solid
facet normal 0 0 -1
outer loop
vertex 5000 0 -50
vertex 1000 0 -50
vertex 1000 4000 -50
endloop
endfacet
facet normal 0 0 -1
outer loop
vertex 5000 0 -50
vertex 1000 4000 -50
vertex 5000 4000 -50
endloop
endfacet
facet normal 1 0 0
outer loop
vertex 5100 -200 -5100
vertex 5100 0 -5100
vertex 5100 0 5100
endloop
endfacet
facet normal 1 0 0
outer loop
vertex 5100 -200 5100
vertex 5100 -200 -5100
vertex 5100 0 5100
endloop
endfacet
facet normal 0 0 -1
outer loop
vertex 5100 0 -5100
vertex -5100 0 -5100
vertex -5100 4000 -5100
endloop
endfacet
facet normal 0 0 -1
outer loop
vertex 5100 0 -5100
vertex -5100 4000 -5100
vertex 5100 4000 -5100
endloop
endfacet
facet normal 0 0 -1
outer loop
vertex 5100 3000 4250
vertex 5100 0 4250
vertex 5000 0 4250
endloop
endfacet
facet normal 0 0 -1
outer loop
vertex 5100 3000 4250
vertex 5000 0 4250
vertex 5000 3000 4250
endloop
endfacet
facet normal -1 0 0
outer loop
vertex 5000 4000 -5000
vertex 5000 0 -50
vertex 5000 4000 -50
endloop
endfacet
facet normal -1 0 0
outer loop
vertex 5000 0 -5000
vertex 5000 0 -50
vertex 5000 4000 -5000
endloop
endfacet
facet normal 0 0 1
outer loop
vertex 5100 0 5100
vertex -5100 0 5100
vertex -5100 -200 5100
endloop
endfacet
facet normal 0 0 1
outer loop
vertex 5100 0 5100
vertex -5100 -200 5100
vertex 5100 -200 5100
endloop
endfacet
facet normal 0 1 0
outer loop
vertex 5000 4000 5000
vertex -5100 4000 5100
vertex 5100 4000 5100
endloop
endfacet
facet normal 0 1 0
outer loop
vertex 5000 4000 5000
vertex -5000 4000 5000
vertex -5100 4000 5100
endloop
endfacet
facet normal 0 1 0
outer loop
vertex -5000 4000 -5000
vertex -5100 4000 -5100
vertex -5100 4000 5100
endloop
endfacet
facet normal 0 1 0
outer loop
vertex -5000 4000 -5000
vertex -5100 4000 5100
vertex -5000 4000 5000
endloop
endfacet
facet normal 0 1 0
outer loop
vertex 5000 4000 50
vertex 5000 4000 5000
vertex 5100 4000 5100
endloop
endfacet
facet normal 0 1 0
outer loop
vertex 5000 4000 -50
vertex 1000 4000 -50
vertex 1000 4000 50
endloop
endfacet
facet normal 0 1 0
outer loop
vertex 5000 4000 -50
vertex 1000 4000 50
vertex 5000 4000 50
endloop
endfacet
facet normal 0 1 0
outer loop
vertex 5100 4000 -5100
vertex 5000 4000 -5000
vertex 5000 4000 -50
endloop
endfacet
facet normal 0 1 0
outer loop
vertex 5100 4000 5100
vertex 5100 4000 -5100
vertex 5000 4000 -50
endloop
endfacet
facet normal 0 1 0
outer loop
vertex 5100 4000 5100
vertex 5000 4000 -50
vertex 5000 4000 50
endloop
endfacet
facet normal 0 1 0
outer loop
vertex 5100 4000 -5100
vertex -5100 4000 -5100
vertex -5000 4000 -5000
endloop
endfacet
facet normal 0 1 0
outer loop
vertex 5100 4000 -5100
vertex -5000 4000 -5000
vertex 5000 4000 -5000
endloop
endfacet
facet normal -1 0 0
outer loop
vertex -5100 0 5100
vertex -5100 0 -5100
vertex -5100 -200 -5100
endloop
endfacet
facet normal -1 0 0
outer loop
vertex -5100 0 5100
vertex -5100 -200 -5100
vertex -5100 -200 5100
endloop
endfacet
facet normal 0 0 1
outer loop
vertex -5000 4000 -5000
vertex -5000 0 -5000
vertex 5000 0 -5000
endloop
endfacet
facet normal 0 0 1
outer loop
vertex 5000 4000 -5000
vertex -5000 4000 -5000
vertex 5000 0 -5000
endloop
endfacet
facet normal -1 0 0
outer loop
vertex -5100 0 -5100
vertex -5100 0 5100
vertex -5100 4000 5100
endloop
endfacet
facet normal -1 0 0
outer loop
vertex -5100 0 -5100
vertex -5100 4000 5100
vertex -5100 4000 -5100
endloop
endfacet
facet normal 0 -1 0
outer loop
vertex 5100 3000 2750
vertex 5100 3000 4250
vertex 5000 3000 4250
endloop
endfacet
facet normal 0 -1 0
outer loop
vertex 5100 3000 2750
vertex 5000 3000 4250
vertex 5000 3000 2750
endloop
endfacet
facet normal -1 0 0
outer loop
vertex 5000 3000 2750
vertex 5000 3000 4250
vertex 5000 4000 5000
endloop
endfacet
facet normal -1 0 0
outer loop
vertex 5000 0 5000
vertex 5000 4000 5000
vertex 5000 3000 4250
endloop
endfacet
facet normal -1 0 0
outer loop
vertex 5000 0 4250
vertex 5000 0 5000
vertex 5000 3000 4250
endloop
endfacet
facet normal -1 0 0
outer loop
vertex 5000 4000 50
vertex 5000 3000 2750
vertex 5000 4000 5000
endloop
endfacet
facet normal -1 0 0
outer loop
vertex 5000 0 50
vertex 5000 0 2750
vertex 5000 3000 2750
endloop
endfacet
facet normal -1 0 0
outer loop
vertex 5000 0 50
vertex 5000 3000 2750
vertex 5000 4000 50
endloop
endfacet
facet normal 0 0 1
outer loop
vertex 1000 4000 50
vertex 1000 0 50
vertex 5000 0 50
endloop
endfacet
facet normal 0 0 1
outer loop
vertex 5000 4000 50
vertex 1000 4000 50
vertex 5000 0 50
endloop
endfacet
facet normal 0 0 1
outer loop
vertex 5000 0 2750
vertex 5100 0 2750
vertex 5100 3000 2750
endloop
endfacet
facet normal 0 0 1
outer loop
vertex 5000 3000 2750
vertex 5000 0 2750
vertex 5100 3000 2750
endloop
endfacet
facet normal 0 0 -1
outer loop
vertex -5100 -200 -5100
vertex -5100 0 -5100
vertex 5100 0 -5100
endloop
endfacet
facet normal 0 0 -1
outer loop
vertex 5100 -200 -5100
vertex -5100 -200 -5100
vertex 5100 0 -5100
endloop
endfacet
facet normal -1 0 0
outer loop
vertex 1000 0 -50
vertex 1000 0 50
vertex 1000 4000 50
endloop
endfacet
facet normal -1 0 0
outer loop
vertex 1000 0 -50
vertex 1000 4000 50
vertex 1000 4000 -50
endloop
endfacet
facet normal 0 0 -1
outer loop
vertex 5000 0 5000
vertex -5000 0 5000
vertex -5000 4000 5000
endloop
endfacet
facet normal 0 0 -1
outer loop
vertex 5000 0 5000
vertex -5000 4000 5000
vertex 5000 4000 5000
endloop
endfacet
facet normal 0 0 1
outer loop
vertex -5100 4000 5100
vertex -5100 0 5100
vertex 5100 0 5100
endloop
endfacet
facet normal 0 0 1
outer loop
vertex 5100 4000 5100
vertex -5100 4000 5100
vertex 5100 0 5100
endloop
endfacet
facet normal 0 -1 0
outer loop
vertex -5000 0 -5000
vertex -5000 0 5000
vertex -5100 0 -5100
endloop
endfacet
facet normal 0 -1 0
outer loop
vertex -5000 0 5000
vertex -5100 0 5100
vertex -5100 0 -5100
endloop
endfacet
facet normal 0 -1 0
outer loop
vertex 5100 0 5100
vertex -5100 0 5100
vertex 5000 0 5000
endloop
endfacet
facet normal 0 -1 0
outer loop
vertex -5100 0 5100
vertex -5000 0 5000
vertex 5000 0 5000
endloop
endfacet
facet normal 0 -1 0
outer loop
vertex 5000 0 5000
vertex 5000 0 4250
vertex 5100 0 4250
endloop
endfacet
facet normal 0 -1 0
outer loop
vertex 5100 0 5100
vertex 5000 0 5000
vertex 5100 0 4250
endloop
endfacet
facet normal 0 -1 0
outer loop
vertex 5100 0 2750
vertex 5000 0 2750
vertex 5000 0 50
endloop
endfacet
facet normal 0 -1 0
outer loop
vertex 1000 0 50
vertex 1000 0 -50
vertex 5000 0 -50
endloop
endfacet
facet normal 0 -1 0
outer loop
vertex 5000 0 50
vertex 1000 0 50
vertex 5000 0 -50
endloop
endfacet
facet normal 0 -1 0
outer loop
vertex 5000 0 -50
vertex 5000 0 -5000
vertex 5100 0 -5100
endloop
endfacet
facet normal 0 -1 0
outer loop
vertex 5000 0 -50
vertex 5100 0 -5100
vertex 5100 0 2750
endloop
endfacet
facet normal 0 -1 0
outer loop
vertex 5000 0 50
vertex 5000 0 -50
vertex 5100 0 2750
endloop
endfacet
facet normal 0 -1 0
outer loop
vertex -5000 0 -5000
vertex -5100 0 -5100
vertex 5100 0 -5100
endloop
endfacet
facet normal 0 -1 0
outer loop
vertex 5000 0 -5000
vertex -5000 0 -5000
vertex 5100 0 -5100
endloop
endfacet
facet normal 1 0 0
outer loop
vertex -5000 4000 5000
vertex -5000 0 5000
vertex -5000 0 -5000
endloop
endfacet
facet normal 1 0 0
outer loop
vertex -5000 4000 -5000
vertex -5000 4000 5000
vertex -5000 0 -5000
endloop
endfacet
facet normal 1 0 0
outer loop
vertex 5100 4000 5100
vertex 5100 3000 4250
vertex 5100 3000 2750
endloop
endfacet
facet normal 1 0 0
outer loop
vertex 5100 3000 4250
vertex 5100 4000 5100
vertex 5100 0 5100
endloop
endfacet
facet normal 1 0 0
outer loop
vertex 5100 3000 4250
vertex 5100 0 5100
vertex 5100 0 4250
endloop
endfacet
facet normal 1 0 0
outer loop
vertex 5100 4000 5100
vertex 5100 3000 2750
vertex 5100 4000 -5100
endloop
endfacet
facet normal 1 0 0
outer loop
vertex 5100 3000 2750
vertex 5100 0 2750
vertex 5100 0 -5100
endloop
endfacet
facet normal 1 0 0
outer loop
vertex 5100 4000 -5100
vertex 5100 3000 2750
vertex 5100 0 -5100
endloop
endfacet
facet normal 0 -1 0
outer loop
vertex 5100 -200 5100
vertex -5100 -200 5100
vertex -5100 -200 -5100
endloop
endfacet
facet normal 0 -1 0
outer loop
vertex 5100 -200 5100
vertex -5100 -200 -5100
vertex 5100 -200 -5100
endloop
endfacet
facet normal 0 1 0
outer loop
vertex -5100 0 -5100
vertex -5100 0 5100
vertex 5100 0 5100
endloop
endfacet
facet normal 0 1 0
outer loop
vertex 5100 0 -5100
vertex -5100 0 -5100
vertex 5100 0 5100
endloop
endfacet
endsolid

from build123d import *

# Parameters (mm, degrees)
SKETCH1_W           = 10200
SKETCH1_H           = 10200
SKETCH1_W_2         = 10000
SKETCH1_H_2         = 10000
SKETCH1_W_3         = 4000
SKETCH1_H_3         = 100
BOSS_EXTRUDE1_DEPTH = 4000
SKETCH2_W           = 10200
SKETCH2_H           = 10200
BOSS_EXTRUDE2_DEPTH = 200
SKETCH3_W           = 1500
SKETCH3_H           = 3000
CUT_EXTRUDE1_DEPTH  = 100


with BuildPart() as part:
    # Sketch1 → Boss-Extrude1 (new body)
    # profile 1 of 2: a face of its own
    with BuildSketch(Plane(origin=(0, 0, 0), x_dir=(1, 0, 0), z_dir=(0, 1, 0))):
        Rectangle(SKETCH1_W, SKETCH1_H)
        Rectangle(SKETCH1_W_2, SKETCH1_H_2, mode=Mode.SUBTRACT)
    # profile 2 of 2: a face of its own
    with BuildSketch(Plane(origin=(0, 0, 0), x_dir=(1, 0, 0), z_dir=(0, 1, 0))):
        with Locations((3000, 0)):
            Rectangle(SKETCH1_W_3, SKETCH1_H_3)
    extrude(amount=BOSS_EXTRUDE1_DEPTH)

    # Sketch3 → Cut-Extrude1 (cut)
    with BuildSketch(Plane(origin=(5100, 0, 0), x_dir=(0, 0, -1), z_dir=(1, 0, 0))):
        with Locations((-3500, 1500)):
            Rectangle(SKETCH3_W, SKETCH3_H)
    extrude(amount=-CUT_EXTRUDE1_DEPTH, mode=Mode.SUBTRACT)


with BuildPart() as body_2:
    # Sketch2 → Boss-Extrude2 (new body)
    with BuildSketch(Plane.XZ):
        Rectangle(SKETCH2_W, SKETCH2_H)
    extrude(amount=BOSS_EXTRUDE2_DEPTH)


solid = Compound([part.part, body_2.part])
